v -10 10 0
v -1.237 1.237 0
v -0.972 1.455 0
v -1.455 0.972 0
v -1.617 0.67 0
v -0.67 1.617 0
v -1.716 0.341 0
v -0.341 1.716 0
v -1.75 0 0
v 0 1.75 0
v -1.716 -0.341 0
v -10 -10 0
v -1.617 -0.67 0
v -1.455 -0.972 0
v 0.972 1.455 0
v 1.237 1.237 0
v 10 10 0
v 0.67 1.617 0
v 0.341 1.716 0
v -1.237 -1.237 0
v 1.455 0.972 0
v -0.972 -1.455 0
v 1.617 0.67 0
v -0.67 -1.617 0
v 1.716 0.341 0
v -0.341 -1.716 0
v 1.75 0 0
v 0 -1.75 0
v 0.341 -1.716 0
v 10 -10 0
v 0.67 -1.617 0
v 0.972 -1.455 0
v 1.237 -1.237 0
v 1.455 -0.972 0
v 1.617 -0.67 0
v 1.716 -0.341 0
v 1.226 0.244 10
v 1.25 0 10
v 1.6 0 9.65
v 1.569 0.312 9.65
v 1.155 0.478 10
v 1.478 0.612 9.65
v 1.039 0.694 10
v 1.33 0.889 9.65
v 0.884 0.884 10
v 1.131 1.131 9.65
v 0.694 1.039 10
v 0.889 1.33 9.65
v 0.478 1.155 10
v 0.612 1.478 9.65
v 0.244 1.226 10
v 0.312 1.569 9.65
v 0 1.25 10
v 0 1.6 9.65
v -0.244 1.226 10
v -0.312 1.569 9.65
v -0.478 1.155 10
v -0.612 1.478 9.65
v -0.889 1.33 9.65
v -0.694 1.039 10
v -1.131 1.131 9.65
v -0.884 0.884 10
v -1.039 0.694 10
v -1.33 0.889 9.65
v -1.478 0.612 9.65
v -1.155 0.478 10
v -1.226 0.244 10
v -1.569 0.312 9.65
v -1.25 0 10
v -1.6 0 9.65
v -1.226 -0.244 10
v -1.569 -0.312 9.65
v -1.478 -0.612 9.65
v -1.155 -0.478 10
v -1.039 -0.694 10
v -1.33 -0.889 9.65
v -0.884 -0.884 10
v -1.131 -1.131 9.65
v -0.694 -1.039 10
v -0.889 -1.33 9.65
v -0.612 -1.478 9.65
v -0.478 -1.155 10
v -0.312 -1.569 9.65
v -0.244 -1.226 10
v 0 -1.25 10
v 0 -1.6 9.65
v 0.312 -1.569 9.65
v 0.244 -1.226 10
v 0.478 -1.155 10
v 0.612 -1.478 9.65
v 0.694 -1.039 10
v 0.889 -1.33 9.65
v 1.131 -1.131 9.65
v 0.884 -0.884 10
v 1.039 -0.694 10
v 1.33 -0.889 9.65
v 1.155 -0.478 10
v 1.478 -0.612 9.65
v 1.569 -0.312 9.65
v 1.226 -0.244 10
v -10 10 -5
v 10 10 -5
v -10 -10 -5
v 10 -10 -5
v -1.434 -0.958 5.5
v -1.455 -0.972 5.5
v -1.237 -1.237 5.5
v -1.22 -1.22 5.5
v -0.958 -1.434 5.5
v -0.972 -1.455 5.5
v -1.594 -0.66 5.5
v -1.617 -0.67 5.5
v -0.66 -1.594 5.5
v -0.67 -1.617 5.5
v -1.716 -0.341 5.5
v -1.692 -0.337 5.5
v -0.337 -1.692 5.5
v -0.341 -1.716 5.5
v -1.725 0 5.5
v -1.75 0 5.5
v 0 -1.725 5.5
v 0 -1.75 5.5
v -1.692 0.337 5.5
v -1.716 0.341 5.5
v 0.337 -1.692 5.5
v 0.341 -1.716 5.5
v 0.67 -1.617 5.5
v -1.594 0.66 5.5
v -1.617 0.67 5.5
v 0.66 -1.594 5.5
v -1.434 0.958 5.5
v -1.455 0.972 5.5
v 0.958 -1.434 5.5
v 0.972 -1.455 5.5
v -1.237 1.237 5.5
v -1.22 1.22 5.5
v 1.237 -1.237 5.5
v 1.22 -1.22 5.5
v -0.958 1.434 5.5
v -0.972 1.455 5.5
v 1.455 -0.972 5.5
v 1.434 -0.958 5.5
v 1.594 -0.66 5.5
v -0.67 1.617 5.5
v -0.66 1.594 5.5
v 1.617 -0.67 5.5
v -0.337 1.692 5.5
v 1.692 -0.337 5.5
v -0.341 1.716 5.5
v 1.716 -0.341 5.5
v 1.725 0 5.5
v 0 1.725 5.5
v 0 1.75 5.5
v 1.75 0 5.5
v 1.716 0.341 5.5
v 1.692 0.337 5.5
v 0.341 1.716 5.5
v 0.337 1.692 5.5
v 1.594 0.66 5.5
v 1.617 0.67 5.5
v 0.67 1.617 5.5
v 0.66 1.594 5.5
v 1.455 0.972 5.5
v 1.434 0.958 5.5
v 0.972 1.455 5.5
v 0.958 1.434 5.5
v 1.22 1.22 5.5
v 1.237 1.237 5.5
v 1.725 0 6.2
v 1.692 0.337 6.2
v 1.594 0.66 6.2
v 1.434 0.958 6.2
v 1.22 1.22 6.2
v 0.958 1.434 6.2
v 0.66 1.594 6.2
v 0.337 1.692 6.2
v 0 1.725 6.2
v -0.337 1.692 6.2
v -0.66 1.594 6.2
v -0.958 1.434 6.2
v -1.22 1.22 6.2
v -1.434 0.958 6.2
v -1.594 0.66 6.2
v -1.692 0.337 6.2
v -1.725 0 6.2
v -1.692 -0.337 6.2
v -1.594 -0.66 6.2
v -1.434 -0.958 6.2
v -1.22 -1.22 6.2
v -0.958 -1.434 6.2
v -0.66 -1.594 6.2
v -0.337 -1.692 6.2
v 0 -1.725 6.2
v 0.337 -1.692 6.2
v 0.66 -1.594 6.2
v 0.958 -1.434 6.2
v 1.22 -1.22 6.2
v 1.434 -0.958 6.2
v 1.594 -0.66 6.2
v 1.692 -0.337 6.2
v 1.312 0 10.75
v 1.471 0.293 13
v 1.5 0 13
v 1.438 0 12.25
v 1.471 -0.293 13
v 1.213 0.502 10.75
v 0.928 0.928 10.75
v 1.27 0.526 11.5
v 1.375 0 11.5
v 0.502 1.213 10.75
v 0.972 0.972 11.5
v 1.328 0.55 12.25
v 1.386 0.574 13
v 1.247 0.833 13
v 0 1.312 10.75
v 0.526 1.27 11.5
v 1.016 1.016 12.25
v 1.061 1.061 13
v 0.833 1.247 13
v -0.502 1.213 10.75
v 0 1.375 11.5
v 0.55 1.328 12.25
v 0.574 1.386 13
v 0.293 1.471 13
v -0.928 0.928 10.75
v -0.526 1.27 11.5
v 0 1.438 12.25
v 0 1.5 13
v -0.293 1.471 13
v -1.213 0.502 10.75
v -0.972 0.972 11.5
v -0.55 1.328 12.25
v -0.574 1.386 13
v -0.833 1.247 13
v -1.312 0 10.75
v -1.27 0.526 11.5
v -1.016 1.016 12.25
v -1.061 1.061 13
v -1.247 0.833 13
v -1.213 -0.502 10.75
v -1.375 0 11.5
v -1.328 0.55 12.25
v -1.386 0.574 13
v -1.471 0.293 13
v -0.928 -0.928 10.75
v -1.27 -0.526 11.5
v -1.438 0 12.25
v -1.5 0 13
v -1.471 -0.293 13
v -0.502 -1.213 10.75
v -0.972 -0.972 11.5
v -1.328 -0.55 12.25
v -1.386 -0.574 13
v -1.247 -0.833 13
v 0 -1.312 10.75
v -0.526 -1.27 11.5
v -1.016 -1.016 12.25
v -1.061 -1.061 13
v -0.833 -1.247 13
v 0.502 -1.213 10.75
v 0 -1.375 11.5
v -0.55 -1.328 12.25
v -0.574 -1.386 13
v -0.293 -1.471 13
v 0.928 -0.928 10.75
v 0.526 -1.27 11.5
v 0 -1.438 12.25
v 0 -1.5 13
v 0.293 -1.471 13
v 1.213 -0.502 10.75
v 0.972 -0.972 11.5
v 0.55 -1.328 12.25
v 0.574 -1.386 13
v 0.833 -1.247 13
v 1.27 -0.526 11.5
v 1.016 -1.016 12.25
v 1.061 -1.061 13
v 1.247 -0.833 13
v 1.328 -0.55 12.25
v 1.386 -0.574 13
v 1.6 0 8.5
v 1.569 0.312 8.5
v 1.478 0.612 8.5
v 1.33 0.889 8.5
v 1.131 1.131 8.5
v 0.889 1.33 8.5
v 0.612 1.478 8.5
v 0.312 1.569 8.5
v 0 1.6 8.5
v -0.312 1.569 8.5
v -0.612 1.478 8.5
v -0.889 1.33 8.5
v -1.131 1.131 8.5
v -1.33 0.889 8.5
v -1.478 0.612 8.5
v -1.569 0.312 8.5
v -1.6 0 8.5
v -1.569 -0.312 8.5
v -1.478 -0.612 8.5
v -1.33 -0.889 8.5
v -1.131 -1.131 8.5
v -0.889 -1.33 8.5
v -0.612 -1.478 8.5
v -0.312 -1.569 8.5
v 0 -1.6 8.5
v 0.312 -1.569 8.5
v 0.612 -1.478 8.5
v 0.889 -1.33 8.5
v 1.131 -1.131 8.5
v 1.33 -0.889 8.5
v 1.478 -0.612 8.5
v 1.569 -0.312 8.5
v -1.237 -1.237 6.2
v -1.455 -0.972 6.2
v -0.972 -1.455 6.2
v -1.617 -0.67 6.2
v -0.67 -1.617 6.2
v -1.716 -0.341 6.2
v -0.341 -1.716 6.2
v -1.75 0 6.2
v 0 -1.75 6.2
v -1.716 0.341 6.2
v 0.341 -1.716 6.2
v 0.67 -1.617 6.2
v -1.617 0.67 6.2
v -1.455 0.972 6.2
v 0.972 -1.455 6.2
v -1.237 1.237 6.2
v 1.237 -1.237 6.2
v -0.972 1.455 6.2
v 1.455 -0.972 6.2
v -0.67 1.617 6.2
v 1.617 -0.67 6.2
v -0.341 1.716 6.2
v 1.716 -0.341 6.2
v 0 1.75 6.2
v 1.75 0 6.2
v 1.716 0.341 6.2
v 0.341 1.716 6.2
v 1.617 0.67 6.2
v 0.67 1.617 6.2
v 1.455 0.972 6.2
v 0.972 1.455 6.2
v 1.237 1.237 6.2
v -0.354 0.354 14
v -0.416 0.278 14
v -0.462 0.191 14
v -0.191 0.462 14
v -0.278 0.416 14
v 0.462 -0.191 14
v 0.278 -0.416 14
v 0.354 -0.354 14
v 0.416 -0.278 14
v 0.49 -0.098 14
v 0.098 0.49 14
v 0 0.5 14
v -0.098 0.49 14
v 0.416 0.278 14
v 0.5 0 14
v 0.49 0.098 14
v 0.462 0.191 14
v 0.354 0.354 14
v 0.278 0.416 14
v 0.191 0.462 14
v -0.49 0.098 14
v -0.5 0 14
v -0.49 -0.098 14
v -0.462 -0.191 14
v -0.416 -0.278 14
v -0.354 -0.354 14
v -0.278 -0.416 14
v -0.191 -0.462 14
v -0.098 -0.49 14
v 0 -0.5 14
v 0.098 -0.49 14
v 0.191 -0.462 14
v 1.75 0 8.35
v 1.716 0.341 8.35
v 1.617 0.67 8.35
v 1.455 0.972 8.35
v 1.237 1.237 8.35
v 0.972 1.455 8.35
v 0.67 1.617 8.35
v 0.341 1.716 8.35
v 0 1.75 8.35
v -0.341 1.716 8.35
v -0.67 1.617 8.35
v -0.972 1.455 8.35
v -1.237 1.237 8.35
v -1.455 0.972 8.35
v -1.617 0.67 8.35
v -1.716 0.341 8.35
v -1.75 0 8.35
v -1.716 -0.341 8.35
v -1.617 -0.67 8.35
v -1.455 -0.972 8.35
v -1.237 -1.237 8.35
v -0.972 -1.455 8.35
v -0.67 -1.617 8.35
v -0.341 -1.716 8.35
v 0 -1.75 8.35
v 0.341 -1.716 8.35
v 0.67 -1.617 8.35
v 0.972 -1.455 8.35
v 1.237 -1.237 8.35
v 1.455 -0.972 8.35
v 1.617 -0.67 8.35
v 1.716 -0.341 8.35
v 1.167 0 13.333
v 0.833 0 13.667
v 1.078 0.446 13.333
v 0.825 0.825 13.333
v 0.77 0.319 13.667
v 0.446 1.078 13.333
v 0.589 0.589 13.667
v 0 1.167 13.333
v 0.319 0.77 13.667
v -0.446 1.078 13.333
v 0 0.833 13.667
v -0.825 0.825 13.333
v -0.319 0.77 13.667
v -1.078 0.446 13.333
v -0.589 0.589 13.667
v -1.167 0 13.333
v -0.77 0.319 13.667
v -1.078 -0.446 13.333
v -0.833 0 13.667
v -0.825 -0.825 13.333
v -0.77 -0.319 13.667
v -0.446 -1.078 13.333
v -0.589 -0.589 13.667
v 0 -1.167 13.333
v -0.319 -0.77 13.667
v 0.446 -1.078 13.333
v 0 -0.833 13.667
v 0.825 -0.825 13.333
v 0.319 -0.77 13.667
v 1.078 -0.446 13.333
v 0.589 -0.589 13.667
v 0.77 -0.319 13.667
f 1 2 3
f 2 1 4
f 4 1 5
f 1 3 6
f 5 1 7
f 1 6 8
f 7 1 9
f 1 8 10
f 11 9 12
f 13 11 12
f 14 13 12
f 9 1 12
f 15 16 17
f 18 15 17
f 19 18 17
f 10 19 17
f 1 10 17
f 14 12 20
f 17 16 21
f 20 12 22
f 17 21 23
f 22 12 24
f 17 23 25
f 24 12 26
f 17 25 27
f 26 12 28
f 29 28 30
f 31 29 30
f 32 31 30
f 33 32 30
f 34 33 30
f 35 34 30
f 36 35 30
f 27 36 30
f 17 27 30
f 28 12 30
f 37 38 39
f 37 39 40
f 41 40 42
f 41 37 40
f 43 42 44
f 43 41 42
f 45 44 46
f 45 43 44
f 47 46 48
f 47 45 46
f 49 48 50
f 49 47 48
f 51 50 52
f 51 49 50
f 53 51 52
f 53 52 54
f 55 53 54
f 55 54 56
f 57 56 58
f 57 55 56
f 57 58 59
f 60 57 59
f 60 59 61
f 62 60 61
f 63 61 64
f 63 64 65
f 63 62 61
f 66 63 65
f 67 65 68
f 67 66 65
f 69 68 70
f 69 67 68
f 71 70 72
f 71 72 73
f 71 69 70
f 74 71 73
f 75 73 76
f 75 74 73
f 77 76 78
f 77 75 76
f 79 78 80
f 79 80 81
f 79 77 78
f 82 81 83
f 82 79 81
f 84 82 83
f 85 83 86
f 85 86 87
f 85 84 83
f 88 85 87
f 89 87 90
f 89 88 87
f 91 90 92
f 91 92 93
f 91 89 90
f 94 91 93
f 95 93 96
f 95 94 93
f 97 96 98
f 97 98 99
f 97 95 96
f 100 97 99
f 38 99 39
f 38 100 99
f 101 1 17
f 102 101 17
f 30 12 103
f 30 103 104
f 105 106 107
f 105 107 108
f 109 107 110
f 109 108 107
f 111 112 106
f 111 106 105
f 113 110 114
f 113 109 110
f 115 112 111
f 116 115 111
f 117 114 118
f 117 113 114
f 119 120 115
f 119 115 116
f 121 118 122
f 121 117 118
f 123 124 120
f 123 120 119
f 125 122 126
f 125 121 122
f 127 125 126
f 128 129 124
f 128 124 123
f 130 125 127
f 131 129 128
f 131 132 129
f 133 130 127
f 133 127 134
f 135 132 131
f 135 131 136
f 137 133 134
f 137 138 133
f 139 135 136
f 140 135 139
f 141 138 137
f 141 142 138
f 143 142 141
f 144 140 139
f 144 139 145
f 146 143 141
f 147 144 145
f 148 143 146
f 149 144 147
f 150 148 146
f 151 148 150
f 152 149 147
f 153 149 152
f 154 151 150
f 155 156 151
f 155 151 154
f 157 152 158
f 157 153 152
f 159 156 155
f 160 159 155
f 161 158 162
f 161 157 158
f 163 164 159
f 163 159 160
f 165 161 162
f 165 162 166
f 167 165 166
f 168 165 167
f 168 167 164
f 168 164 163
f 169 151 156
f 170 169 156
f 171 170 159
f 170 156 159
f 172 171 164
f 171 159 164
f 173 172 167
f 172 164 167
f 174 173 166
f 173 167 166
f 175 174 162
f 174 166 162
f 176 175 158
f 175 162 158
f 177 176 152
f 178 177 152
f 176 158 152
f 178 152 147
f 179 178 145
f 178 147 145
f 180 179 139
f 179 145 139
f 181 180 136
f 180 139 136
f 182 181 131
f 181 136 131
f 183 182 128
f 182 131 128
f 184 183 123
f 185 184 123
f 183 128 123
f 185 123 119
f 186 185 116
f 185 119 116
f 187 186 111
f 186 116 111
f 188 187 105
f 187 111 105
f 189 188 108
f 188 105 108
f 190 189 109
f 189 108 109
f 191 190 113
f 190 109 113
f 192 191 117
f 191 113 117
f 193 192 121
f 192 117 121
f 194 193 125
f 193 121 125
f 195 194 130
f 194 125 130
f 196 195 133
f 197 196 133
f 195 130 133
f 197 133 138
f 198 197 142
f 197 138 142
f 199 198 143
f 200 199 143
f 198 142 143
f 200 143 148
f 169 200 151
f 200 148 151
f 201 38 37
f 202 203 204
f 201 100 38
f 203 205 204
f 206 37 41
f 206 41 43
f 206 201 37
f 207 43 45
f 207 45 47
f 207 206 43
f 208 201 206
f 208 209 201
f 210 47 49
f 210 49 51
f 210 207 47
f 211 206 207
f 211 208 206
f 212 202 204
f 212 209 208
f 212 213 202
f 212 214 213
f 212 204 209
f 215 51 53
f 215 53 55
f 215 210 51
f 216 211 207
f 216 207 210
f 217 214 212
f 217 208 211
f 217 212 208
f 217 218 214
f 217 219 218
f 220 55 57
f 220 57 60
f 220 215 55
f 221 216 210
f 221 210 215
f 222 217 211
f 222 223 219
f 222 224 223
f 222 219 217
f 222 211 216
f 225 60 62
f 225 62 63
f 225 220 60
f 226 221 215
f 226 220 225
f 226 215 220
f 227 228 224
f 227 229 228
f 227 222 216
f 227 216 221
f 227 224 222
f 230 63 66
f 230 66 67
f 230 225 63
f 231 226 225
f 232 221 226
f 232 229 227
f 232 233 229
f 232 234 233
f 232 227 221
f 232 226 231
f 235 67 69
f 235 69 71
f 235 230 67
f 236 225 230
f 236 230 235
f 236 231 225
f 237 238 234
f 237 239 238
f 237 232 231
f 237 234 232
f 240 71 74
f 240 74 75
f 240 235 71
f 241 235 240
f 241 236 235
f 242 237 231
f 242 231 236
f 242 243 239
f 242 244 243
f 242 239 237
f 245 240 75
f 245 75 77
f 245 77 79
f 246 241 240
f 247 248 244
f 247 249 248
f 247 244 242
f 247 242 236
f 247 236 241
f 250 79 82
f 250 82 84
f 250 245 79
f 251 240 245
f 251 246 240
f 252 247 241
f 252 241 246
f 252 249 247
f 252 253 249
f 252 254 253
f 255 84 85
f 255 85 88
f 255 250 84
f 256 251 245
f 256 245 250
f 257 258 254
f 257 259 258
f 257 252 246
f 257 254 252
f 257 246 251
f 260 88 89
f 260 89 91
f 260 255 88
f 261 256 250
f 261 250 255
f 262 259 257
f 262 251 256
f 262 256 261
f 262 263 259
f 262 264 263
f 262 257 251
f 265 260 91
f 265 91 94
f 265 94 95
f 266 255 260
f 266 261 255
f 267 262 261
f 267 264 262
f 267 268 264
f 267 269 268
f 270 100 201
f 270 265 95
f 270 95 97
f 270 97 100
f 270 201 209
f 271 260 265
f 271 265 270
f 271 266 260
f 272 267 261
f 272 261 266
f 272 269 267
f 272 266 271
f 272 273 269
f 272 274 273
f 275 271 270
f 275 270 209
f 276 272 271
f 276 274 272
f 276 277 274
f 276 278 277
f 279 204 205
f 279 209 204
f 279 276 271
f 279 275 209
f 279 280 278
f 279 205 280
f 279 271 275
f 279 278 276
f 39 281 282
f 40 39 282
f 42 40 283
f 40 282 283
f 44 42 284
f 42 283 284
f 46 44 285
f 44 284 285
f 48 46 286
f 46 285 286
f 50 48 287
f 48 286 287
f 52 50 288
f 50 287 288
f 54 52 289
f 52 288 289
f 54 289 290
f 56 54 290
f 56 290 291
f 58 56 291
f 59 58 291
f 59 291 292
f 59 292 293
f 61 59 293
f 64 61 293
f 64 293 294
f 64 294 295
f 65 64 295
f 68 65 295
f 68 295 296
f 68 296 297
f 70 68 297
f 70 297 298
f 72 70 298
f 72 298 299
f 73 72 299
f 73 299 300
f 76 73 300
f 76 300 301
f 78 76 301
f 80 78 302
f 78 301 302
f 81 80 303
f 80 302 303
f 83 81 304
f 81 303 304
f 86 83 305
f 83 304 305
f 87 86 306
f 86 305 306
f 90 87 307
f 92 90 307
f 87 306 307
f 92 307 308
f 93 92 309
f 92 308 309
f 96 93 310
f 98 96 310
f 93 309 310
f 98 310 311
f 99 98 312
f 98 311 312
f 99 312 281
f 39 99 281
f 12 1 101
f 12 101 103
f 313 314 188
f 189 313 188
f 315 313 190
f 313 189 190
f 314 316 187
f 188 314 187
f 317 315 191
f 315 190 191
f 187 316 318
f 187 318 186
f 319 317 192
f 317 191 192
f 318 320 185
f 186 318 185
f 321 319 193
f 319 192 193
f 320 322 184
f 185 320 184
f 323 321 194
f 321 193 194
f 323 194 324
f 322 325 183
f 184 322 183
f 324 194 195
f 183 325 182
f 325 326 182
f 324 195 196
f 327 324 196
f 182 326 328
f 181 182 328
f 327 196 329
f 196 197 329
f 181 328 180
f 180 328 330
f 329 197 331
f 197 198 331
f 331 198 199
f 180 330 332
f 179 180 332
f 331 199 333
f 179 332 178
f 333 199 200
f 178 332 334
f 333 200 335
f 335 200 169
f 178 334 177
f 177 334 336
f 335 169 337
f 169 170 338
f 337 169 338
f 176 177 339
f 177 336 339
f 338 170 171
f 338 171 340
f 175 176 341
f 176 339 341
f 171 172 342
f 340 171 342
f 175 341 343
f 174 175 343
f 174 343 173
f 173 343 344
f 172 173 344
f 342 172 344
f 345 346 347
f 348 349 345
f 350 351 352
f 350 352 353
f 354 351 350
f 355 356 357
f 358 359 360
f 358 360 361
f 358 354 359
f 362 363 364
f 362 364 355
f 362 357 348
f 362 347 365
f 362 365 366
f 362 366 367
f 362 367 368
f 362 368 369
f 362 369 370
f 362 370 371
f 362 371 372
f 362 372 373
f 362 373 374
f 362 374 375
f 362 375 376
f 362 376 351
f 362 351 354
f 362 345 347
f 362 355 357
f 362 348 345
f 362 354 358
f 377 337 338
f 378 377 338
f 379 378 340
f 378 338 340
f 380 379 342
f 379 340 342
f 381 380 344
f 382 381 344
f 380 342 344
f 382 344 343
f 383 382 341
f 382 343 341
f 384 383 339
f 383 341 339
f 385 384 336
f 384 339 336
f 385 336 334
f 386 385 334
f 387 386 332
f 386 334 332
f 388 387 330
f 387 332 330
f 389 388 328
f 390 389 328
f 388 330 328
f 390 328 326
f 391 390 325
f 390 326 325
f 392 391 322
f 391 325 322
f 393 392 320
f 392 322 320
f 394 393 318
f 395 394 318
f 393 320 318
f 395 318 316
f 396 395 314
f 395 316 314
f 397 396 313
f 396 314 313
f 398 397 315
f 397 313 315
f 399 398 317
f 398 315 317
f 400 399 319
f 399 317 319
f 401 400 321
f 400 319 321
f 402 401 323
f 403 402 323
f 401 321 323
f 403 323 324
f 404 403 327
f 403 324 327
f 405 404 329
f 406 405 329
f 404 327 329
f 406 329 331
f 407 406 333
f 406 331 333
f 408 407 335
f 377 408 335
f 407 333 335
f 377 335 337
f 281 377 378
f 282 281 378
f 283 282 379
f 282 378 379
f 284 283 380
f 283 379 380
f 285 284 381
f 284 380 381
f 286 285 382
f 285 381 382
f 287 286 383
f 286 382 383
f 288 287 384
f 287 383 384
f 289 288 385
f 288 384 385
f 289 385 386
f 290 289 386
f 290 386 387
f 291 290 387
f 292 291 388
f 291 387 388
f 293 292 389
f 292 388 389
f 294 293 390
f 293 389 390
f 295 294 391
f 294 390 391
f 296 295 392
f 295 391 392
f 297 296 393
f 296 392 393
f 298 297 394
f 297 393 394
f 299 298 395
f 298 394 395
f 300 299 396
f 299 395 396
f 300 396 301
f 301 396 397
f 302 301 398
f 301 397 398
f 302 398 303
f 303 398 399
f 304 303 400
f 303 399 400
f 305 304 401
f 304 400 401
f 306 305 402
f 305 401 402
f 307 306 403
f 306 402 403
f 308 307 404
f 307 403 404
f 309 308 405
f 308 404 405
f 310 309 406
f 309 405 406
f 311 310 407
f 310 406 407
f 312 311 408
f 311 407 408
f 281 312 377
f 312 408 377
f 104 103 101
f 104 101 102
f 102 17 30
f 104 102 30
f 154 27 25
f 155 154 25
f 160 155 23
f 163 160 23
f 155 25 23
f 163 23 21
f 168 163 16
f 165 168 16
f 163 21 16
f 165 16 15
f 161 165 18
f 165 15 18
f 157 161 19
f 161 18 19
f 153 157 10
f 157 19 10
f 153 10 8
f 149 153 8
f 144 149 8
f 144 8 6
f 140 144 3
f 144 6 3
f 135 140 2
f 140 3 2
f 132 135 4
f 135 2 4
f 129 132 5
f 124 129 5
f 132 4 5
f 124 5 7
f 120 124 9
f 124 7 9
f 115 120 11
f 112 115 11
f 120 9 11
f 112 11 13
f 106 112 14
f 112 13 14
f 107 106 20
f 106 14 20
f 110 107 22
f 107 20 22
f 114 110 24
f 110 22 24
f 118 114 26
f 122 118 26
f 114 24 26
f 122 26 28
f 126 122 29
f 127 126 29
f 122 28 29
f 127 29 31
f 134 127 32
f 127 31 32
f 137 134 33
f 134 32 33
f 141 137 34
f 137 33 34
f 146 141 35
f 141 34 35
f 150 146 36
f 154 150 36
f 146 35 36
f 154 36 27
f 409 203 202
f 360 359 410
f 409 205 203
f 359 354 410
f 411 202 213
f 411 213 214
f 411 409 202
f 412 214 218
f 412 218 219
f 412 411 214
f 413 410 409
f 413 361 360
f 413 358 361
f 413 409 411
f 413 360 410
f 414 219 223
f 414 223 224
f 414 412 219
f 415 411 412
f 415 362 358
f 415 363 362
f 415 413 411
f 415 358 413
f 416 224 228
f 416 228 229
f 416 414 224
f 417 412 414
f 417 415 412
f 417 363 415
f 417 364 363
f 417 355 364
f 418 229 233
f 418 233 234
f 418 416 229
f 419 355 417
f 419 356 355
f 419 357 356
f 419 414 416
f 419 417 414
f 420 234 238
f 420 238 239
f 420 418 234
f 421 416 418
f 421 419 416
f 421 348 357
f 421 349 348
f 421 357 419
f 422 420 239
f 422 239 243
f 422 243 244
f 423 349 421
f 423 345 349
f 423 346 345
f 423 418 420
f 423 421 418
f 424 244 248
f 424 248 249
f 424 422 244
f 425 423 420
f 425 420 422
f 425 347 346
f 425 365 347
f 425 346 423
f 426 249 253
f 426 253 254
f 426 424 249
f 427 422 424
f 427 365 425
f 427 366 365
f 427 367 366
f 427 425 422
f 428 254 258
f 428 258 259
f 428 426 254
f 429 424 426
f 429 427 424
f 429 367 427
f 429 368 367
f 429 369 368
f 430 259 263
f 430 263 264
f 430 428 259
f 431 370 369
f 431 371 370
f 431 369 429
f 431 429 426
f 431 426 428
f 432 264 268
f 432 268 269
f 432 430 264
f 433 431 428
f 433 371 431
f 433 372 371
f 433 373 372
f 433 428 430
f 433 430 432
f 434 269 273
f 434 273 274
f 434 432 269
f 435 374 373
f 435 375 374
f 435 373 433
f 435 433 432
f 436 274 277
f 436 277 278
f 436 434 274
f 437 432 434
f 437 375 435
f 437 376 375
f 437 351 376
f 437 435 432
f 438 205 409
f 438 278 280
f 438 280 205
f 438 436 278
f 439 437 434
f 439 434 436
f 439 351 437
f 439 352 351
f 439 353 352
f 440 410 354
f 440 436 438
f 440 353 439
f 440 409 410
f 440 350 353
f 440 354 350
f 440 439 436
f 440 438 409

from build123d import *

# Parameters (mm, degrees)
F0_R      = 1.75
F1_DEPTH  = 5.5
F3_R      = 1.725
F4_DEPTH  = 0.7
F6_R      = 1.75
F7_DEPTH  = 2.3
F9_R      = 1.6
F10_DEPTH = 0.7
F12_R     = 1.6
F13_DEPTH = 0.8
F15_R     = 1.25
F17_R     = 1.5
F20_R     = 1.5
F21_DEPTH = 1
F22_SIZE2 = 0.99999
F22_SIZE  = 0.99999
F23_SIZE  = 0.14999
F24_SIZE  = 0.34999
F26_W     = 20
F26_H     = 20
F27_DEPTH = 5


# Not quite as in the source:
# - a fillet or chamfer is up to 0.001 mm smaller than in the source, because OpenCascade refuses the exact size


with BuildPart() as f1:
    # F0 (on Top) → F1 (new body)
    with BuildSketch(Plane.XY):
        Circle(F0_R)
    extrude(amount=F1_DEPTH)

    # F3 (on offset) → F4 (join)
    with BuildSketch(Plane.XY.offset(5.5)):
        Circle(F3_R)
    extrude(amount=F4_DEPTH)

    # F6 (on offset) → F7 (join)
    with BuildSketch(Plane.XY.offset(6.2)):
        Circle(F6_R)
    extrude(amount=F7_DEPTH)

    # F9 (on offset) → F10 (join)
    with BuildSketch(Plane.XY.offset(8.5)):
        Circle(F9_R)
    extrude(amount=F10_DEPTH)

    # F12 (on offset) → F13 (join)
    with BuildSketch(Plane.XY.offset(9.2)):
        Circle(F12_R)
    extrude(amount=F13_DEPTH)

    # F15 (on offset) → F18 section 0
    with BuildSketch(Plane.XY.offset(10)):
        Circle(F15_R)
    # F17 (on offset) → F18 section 1
    with BuildSketch(Plane.XY.offset(13)):
        Circle(F17_R)
    loft()

    # F20 (on offset) → F21 (join)
    with BuildSketch(Plane.XY.offset(13)):
        Circle(F20_R)
    extrude(amount=F21_DEPTH)

    # F22 (size 1 and 1 in the source; OpenCascade refuses exactly that, so slightly less here)
    f22_edges = [f1.edges().sort_by_distance(p)[0] for p in [
        (-1.5, 0, 14),
    ]]
    chamfer(f22_edges, length=F22_SIZE, length2=F22_SIZE2)

    # F23 (size 0.15 in the source; OpenCascade refuses exactly that, so slightly less here)
    f23_edges = [f1.edges().sort_by_distance(p)[0] for p in [
        (-1.75, 0, 8.5),
    ]]
    chamfer(f23_edges, length=F23_SIZE)

    # F24 (size 0.35 in the source; OpenCascade refuses exactly that, so slightly less here)
    f24_edges = [f1.edges().sort_by_distance(p)[0] for p in [
        (-1.6, 0, 10),
    ]]
    chamfer(f24_edges, length=F24_SIZE)

    # F26 (on offset) → F27 (join)
    with BuildSketch(Plane(origin=(0, 0, 0), x_dir=(1, 0, 0), z_dir=(0, 0, -1))):
        Rectangle(F26_W, F26_H)
    extrude(amount=F27_DEPTH)


solid = f1.part
